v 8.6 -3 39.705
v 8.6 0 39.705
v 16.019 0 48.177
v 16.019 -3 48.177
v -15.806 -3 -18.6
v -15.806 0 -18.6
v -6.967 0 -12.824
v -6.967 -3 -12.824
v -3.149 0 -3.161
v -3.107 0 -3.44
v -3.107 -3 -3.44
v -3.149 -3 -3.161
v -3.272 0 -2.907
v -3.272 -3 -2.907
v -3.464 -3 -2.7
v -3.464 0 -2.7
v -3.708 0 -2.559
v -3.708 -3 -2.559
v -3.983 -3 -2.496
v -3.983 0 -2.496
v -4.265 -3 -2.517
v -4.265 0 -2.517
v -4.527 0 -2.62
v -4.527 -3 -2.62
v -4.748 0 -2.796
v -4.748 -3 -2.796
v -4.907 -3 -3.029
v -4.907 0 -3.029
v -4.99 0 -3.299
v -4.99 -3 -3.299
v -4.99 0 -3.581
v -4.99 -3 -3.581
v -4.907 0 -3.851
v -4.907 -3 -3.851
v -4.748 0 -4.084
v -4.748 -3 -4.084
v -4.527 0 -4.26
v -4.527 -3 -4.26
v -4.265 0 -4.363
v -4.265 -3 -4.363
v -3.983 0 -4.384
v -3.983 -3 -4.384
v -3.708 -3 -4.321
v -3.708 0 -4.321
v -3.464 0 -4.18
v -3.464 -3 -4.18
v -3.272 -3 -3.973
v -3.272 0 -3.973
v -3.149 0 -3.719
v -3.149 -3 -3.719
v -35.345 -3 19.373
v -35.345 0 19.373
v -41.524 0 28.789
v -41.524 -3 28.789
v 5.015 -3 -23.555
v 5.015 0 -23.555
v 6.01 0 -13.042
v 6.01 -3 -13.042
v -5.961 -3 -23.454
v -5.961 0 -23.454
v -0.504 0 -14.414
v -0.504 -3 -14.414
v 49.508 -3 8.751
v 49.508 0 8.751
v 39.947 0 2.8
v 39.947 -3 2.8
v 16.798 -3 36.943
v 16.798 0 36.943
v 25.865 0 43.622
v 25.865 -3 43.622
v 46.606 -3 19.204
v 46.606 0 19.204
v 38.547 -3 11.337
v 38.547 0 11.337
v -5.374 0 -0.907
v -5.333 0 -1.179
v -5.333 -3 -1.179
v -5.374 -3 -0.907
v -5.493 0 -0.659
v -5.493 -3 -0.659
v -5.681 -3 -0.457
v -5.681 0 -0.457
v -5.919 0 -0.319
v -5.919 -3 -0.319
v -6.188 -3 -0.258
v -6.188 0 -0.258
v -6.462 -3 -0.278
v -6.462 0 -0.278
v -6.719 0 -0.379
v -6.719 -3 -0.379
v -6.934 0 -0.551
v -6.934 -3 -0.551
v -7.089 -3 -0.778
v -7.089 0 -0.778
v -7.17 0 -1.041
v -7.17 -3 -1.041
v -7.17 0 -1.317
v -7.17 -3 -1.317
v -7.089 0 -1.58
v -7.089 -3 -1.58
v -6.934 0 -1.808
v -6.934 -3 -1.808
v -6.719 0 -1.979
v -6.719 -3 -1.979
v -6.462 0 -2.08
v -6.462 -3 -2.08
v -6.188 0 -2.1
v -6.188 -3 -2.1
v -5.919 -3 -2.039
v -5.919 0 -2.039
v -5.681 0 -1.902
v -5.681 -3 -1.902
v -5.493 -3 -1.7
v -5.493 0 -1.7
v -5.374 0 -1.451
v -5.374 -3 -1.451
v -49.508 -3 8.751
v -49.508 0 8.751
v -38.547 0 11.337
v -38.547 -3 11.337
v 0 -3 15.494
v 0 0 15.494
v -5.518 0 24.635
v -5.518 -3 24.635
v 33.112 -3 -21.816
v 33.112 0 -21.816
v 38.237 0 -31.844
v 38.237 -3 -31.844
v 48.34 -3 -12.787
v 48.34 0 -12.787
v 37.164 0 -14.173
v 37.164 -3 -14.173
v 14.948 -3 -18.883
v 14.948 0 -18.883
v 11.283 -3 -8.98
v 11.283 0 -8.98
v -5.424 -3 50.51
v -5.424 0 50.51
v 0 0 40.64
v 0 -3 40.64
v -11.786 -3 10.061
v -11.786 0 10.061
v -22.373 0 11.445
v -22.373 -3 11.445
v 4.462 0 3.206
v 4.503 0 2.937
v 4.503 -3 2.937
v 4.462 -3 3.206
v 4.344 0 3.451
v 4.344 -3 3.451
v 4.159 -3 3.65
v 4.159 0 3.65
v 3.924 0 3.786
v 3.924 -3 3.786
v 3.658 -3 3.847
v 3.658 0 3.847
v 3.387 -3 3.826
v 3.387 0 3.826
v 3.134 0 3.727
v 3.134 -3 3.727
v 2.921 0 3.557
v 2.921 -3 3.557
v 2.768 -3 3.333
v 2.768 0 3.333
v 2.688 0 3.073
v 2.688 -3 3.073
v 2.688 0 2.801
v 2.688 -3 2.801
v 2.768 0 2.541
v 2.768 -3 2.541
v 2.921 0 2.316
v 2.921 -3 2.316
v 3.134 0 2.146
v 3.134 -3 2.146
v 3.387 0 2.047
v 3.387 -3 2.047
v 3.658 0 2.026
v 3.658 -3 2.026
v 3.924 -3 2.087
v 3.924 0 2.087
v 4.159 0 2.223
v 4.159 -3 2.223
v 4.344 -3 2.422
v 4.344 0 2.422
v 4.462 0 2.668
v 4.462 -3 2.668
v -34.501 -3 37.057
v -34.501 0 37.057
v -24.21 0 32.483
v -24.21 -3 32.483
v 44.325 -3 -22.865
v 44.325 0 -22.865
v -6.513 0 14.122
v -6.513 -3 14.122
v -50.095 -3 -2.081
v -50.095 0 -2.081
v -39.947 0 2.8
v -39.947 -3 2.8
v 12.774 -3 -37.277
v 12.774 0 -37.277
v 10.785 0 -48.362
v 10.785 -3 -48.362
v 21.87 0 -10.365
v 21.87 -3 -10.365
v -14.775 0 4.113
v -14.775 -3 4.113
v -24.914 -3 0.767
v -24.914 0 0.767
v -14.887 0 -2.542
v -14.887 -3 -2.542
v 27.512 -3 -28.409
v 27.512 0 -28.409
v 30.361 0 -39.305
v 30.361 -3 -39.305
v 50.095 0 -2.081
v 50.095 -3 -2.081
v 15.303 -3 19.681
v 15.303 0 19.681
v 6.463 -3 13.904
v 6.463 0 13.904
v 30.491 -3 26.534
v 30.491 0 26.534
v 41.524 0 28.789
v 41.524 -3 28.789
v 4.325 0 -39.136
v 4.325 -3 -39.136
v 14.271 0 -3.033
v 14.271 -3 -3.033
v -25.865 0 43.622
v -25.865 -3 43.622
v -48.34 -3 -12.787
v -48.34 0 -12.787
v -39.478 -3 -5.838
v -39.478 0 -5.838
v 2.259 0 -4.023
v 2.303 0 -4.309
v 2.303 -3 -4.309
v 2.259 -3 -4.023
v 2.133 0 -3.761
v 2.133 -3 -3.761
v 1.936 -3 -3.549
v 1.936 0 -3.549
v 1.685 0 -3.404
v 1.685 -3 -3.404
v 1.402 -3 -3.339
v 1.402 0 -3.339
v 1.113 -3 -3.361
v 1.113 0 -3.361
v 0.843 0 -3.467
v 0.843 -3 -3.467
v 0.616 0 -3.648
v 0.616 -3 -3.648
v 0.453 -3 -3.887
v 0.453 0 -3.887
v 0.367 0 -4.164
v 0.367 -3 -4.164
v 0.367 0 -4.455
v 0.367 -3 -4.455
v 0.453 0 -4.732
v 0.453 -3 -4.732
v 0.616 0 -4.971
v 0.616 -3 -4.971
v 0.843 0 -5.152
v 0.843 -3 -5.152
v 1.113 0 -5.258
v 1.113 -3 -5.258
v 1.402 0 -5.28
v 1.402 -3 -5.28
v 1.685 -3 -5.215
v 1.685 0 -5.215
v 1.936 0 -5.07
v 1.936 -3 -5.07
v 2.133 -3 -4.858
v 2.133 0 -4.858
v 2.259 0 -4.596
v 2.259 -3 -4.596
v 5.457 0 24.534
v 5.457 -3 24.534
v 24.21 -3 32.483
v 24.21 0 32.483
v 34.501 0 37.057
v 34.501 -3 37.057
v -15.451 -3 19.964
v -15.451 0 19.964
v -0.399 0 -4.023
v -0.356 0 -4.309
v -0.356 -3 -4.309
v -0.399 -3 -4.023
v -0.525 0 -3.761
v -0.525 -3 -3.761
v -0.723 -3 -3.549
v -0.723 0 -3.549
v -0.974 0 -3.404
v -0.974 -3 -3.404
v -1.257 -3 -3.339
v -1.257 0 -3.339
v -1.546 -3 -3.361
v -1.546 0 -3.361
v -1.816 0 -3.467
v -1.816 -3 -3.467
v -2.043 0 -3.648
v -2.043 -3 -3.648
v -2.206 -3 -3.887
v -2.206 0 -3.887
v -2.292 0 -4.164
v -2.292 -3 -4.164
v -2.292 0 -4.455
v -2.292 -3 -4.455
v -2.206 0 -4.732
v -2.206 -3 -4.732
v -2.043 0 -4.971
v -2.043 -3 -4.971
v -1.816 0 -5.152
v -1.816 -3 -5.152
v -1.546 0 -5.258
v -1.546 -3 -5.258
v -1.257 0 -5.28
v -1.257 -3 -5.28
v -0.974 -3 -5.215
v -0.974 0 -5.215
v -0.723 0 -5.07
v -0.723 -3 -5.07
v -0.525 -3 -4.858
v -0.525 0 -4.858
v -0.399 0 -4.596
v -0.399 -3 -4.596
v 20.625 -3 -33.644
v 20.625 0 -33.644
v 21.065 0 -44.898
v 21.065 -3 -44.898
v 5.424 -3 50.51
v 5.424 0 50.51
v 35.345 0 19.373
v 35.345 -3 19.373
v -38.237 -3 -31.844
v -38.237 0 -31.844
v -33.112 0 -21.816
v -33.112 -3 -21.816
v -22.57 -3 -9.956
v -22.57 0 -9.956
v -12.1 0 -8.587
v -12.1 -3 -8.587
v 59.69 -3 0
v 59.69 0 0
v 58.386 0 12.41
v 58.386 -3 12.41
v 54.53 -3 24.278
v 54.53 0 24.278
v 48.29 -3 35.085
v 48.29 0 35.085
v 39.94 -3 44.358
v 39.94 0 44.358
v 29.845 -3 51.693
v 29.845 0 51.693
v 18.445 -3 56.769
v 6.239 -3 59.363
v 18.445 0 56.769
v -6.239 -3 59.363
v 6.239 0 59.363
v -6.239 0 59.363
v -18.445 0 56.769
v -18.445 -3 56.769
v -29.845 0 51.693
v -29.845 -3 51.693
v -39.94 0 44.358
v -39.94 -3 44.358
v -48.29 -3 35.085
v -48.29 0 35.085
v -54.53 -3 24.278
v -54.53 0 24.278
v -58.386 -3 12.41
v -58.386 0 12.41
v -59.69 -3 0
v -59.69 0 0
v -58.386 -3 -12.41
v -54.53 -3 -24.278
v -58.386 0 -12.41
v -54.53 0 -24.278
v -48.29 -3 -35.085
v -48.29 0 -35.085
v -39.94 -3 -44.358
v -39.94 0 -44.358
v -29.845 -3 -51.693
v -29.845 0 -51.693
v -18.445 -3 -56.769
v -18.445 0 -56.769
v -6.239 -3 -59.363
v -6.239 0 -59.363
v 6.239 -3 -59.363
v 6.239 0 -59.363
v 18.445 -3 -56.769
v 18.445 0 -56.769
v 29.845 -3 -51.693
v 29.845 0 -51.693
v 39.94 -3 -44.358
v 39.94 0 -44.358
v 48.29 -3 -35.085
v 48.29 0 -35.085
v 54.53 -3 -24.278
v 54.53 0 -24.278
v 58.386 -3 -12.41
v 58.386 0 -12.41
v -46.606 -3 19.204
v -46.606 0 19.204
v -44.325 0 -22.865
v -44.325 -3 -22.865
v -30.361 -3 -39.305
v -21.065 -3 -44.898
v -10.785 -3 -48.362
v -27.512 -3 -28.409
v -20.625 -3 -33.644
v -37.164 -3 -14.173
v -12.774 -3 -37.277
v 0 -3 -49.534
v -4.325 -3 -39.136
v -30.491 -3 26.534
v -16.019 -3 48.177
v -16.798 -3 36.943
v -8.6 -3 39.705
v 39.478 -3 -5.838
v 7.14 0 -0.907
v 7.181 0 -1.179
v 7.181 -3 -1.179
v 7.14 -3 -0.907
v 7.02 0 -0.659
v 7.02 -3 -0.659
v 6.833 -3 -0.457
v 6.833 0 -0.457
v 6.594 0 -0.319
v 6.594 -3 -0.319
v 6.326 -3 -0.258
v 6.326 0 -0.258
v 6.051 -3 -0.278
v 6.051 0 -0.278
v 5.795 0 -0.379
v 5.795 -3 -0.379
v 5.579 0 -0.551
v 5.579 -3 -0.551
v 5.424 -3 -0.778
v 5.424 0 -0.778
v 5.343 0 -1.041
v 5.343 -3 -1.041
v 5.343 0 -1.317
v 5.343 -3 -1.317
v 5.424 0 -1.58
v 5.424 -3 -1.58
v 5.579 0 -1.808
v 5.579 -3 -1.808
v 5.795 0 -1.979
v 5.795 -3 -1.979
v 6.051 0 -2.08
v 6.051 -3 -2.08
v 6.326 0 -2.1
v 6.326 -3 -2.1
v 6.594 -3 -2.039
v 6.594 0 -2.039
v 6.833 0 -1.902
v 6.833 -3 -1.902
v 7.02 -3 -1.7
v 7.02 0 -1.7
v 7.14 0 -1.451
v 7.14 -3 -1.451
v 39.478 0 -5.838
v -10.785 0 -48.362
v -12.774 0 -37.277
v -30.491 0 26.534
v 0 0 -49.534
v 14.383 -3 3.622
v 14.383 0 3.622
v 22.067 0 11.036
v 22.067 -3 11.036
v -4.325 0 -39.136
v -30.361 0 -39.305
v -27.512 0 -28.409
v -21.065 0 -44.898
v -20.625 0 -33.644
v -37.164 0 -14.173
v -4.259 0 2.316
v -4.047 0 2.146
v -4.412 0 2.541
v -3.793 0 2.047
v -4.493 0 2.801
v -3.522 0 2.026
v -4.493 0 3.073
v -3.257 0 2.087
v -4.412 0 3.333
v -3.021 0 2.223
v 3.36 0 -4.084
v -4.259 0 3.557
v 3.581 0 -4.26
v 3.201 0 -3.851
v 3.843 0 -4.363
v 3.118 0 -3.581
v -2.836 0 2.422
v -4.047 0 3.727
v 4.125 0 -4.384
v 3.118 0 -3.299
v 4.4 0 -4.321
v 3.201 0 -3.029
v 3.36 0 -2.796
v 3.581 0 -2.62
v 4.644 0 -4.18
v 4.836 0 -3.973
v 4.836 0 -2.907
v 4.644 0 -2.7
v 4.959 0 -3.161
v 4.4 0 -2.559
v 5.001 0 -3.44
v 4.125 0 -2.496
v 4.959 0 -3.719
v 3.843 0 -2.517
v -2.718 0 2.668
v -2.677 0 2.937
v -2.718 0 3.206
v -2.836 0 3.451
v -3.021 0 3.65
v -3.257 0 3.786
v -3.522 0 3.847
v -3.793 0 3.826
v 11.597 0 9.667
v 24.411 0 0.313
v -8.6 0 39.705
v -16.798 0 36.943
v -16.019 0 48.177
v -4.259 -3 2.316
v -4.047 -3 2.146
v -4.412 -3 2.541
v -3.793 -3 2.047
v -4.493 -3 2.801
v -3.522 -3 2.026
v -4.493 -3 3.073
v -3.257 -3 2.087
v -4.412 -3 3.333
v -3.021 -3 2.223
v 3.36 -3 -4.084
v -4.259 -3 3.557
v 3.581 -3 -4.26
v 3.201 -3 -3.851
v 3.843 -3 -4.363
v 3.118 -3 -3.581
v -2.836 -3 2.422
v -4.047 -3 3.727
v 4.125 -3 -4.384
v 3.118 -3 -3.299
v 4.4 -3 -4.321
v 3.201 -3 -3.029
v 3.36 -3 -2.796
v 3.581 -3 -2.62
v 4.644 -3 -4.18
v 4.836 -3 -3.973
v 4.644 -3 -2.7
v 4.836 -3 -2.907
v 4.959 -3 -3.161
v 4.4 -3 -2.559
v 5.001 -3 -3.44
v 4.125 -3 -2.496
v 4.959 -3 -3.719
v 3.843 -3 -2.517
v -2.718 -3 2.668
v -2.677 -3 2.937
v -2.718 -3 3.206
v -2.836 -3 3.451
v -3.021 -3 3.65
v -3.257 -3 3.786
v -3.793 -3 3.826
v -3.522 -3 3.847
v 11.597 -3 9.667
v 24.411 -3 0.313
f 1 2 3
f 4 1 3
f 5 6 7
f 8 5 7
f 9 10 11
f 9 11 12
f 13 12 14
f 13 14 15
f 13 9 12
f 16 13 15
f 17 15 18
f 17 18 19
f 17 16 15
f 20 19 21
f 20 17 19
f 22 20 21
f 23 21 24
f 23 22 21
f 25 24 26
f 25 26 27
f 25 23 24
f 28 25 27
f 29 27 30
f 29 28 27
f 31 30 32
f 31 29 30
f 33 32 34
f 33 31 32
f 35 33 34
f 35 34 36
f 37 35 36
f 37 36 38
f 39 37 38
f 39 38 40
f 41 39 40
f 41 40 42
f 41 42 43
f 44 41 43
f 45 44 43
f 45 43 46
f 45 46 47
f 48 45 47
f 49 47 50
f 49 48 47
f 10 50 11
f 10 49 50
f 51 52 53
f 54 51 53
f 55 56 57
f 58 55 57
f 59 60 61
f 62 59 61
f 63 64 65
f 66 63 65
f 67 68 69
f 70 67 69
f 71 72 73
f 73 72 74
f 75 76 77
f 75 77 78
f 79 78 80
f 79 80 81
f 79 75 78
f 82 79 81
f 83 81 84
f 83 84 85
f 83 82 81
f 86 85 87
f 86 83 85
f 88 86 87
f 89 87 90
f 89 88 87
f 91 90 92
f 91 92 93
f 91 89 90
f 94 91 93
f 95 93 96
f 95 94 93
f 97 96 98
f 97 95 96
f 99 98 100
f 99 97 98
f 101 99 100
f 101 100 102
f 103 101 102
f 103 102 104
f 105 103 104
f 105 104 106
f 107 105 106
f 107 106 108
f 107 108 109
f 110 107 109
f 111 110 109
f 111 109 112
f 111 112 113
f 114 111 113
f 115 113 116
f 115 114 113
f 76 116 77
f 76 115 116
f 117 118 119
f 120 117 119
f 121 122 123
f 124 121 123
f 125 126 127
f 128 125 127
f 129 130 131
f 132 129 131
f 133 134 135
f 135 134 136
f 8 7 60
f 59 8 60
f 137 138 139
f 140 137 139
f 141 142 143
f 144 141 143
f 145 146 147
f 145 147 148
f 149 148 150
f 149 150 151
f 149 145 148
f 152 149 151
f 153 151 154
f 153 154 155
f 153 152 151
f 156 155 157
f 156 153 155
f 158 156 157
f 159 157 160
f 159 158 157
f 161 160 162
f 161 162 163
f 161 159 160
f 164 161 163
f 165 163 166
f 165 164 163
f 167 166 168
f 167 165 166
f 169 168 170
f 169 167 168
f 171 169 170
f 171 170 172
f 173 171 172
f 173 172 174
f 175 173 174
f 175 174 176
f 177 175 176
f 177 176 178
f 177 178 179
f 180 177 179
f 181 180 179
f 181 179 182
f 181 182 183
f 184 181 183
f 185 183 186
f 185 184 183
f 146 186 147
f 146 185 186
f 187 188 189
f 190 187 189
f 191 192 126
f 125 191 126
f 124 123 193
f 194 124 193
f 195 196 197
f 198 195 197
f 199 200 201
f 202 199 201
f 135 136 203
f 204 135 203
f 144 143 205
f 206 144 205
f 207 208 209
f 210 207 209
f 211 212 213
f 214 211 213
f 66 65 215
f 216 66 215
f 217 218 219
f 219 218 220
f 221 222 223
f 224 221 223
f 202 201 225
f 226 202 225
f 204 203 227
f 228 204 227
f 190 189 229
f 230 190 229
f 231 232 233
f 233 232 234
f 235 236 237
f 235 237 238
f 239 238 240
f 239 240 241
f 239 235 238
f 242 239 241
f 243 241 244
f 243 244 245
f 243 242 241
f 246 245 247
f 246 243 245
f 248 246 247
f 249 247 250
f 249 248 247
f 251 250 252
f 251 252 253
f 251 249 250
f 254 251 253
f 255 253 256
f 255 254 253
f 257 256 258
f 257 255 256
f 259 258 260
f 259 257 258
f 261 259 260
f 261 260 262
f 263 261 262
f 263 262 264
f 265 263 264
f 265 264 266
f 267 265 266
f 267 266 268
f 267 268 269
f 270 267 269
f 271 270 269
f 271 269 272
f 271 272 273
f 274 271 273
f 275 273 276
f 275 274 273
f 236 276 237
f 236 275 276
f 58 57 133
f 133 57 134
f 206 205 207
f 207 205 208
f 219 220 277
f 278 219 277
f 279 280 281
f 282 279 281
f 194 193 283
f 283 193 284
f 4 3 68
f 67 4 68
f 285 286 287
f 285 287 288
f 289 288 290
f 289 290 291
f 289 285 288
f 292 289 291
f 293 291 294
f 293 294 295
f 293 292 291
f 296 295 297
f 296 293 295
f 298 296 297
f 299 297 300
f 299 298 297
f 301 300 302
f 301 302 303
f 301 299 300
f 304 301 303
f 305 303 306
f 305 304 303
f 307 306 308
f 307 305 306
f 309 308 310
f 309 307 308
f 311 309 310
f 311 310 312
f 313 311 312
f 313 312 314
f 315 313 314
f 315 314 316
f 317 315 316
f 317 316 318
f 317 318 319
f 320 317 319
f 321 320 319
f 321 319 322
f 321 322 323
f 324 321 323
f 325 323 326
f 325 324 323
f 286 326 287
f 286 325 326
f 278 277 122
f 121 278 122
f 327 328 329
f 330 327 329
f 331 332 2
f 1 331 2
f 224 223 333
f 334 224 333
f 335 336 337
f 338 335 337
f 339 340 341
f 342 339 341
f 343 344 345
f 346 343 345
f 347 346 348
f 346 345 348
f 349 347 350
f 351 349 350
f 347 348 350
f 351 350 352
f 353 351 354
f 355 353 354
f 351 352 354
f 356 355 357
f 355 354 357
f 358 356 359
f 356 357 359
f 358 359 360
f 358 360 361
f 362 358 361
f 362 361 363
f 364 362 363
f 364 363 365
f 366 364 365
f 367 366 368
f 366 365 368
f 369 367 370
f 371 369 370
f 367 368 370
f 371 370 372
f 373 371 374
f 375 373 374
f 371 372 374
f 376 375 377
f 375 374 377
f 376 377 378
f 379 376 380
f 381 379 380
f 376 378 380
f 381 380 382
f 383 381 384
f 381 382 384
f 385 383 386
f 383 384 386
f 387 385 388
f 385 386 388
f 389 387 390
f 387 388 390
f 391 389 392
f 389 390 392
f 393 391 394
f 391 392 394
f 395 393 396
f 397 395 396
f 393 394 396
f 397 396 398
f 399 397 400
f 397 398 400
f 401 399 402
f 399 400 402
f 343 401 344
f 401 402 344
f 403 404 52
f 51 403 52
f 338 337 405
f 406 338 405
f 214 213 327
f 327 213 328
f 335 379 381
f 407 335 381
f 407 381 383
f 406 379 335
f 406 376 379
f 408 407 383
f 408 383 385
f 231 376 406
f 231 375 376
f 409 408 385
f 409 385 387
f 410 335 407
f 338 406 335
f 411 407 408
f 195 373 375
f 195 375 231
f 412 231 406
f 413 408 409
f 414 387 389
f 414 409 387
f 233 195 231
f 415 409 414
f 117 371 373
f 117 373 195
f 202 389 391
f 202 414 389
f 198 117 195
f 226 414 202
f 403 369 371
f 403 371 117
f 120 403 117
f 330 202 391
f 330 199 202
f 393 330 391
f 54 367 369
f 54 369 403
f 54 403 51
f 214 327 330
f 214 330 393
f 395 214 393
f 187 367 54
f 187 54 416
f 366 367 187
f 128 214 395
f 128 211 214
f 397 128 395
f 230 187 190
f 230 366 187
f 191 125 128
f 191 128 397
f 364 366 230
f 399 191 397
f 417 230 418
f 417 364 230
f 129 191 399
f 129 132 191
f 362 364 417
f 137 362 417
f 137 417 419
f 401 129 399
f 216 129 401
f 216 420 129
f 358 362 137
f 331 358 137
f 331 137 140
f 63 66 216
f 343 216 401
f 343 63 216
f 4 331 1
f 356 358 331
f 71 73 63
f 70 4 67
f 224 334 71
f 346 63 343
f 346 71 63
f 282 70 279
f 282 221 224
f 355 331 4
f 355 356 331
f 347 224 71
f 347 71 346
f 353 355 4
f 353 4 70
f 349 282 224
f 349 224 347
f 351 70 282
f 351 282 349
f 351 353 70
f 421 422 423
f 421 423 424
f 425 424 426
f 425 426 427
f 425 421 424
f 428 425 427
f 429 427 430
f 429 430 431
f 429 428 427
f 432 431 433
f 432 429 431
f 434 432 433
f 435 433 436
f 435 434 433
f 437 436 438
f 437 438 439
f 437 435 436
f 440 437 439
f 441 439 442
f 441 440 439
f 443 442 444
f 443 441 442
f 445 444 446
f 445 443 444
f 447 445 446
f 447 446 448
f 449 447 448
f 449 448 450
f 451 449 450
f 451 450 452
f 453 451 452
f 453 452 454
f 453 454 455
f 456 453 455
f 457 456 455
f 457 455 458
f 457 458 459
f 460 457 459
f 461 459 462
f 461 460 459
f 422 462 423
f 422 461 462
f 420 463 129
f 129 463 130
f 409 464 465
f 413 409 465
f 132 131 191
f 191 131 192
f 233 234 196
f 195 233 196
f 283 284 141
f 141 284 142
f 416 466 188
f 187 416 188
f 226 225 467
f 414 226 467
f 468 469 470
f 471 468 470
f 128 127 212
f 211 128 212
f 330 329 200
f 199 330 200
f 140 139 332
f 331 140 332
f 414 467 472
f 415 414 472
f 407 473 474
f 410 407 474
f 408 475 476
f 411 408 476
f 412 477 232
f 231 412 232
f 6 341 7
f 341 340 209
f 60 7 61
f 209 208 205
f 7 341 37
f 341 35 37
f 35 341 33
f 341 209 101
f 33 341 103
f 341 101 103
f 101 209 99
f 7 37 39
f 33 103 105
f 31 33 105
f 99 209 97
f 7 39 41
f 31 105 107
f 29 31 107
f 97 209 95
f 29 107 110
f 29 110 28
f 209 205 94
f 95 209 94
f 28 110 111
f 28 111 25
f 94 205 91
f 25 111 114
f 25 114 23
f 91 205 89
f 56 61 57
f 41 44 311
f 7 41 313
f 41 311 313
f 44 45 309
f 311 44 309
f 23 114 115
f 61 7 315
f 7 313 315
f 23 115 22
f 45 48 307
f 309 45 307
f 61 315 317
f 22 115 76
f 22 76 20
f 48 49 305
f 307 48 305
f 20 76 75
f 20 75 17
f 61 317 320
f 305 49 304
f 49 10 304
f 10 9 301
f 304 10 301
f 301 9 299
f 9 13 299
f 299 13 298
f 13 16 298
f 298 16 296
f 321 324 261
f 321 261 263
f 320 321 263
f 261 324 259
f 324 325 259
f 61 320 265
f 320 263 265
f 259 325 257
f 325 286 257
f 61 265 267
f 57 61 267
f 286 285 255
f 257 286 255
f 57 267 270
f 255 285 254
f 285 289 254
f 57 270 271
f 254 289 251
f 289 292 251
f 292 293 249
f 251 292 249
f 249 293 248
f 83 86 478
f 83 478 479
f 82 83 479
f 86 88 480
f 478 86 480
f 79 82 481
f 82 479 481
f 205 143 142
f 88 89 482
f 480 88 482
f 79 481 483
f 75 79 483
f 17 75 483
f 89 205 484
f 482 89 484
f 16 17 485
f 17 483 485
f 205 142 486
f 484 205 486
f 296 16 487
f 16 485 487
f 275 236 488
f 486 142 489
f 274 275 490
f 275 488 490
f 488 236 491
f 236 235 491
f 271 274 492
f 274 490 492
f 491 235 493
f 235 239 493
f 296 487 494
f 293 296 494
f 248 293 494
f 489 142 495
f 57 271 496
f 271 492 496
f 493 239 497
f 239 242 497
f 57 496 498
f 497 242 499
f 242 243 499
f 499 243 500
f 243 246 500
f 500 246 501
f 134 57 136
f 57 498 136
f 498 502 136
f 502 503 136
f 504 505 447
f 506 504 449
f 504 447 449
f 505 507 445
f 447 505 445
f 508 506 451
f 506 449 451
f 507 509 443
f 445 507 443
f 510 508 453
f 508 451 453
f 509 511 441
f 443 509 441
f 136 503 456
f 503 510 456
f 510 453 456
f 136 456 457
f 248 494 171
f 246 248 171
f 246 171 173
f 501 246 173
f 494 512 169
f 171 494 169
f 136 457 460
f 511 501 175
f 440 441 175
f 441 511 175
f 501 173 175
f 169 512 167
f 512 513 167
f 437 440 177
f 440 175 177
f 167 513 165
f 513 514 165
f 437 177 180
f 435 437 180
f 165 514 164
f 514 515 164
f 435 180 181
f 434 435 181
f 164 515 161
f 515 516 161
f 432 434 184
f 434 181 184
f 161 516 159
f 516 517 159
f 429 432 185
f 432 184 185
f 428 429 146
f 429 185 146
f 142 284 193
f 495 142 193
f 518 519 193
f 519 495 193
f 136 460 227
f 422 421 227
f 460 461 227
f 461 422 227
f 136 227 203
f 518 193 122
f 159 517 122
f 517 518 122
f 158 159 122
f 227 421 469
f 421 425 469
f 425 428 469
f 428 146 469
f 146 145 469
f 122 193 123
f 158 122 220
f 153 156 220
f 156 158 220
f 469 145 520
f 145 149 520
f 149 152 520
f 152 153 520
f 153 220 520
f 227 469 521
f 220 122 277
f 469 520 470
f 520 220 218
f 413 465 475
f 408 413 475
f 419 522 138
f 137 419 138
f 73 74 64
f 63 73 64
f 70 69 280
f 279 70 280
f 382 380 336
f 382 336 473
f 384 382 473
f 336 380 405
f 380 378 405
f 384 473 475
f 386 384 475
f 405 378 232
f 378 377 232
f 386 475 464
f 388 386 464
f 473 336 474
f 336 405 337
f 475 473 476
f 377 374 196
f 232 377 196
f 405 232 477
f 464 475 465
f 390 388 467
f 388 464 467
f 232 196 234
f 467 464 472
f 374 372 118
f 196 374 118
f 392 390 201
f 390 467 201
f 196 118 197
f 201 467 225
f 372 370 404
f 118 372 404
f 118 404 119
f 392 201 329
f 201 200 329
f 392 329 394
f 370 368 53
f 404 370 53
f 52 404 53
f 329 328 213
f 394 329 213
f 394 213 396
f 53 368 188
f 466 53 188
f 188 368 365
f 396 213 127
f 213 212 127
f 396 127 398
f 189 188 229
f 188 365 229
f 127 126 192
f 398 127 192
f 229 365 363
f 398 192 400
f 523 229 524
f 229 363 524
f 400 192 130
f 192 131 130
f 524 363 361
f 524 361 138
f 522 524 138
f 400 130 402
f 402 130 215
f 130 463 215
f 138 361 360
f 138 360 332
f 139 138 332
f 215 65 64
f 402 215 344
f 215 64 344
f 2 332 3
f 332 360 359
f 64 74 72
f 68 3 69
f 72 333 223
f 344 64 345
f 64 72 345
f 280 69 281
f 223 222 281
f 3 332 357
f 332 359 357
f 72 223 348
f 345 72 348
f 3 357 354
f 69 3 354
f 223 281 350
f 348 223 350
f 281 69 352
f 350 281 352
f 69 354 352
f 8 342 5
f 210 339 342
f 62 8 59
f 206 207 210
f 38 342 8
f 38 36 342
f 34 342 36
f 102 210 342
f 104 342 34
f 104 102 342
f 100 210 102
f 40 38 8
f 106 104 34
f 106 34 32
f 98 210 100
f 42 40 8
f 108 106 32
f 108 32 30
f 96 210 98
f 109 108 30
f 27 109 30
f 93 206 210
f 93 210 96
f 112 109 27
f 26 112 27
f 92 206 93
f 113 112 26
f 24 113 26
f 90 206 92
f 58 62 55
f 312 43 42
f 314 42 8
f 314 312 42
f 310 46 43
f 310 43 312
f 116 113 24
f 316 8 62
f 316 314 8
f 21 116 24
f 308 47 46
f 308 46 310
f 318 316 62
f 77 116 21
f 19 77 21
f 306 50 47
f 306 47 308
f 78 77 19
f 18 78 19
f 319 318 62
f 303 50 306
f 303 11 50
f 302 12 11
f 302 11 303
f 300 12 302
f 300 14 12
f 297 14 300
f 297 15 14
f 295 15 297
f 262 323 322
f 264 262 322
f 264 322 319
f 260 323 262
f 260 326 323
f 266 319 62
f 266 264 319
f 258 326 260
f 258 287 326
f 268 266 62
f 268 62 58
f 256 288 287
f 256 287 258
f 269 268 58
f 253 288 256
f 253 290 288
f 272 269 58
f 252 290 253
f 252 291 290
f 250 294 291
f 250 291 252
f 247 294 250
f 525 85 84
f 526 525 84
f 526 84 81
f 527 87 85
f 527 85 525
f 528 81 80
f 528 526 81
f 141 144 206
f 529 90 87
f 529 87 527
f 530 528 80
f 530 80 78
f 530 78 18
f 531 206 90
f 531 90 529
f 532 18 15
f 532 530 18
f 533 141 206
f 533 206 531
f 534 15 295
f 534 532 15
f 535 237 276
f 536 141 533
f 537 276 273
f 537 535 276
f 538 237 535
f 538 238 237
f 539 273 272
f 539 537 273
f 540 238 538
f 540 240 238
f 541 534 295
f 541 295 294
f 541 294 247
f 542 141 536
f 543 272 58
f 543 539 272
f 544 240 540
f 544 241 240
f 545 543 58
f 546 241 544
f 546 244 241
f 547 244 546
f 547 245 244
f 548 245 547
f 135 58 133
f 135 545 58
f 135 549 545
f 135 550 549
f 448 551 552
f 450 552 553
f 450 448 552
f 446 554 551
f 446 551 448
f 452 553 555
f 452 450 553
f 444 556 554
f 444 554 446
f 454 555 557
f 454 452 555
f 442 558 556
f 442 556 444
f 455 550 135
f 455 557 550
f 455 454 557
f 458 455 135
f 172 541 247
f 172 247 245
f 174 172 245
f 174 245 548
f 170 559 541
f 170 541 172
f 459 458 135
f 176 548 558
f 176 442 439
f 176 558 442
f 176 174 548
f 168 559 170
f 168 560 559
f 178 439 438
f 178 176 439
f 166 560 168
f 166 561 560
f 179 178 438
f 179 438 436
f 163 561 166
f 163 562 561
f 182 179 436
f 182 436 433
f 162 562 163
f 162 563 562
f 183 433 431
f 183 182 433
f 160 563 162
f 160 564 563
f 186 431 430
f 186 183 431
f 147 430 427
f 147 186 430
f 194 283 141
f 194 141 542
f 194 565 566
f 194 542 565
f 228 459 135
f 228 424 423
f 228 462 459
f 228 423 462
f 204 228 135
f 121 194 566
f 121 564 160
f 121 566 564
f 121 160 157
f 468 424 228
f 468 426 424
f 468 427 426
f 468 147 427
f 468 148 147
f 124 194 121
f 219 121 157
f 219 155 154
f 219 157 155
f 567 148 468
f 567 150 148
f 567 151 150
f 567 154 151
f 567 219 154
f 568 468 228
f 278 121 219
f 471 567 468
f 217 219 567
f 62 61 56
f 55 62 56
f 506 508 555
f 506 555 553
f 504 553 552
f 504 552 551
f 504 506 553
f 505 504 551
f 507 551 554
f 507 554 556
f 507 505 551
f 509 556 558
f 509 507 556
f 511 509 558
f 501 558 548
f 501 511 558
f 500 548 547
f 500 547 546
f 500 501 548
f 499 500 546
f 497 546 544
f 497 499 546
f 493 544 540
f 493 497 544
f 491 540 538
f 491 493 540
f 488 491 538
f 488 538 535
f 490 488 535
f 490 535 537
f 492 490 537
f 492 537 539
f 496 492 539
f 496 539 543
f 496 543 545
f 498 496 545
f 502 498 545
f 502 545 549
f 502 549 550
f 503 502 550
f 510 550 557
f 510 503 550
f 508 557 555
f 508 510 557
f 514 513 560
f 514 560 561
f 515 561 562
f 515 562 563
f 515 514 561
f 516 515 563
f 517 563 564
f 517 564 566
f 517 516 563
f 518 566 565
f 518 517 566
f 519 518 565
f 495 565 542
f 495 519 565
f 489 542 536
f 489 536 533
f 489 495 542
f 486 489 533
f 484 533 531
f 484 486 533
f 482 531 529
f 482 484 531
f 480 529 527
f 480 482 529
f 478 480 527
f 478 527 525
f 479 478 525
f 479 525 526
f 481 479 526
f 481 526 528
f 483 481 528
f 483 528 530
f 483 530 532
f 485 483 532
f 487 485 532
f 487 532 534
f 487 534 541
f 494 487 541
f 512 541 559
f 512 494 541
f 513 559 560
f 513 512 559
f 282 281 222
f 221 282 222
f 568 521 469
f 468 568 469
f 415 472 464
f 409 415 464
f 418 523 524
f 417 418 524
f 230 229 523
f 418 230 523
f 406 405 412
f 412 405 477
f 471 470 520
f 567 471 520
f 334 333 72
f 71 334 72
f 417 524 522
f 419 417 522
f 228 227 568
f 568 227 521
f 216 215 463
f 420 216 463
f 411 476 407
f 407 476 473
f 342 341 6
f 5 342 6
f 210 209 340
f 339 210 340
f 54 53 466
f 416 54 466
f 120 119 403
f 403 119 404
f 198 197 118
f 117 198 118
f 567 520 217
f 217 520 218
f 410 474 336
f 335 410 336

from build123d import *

# Parameters (mm, degrees)
F0_R     = 59.69
F0_R_2   = 0.973209
F0_R_3   = 0.946708
F0_R_4   = 0.923894
F0_R_5   = 0.912695
F1_DEPTH = 3


with BuildPart() as f1:
    # F0 (on Front) → F1 (new body)
    with BuildSketch(Plane.XZ):
        Circle(F0_R)
        Polygon((-5.424229, 50.509581), (0, 40.640013), (5.424229, 50.509581), (8.599977, 39.704709), (16.019056, 48.177483), (16.797829, 36.942531), (25.86485, 43.622334), (24.210233, 32.482636), (34.501232, 37.057127), (30.490593, 26.533562), (41.524375, 28.788844), (35.345247, 19.373483), (46.605884, 19.204101), (38.547197, 11.337196), (49.508154, 8.751069), (39.946722, 2.800468), (50.095477, -2.081479), (39.478383, -5.837533), (48.340392, -12.787025), (37.164079, -14.172903), (44.324964, -22.864989), (33.112024, -21.81589), (38.23695, -31.844139), (27.511687, -28.409116), (30.361018, -39.304617), (20.624935, -33.644289), (21.065439, -44.897582), (12.773783, -37.276619), (10.784864, -48.361511), (4.325344, -39.136261), (0, -49.534435), (-4.325344, -39.136261), (-10.784864, -48.361511), (-12.773783, -37.276619), (-21.065439, -44.897582), (-20.624935, -33.644289), (-30.361018, -39.304617), (-27.511687, -28.409116), (-38.23695, -31.844139), (-33.112024, -21.81589), (-44.324964, -22.864989), (-37.164079, -14.172903), (-48.340392, -12.787025), (-39.478383, -5.837533), (-50.095477, -2.081479), (-39.946722, 2.800468), (-49.508154, 8.751069), (-38.547197, 11.337196), (-46.605884, 19.204101), (-35.345247, 19.373483), (-41.524375, 28.788844), (-30.490593, 26.533562), (-34.501232, 37.057127), (-24.210233, 32.482636), (-25.86485, 43.622334), (-16.797829, 36.942531), (-16.019056, 48.177483), (-8.599977, 39.704709), align=None, mode=Mode.SUBTRACT)
        Polygon((5.457441, 24.533876), (0, 15.494), (-5.518424, 24.634891), (-6.513153, 14.122349), (-15.451165, 19.963654), (-11.786164, 10.060584), (-22.373481, 11.445359), (-14.774648, 4.113186), (-24.914323, 0.76716), (-14.886701, -2.541889), (-22.570446, -9.955994), (-12.100128, -8.586523), (-15.806083, -18.600253), (-6.966844, -12.8235), (-5.961, -23.453513), (-0.503559, -14.413637), (5.014865, -23.554528), (6.009594, -13.041986), (14.947606, -18.883291), (11.282604, -8.980221), (21.869922, -10.364996), (14.271089, -3.032823), (24.410764, 0.313203), (14.383142, 3.622252), (22.066887, 11.036358), (11.596568, 9.666886), (15.302524, 19.680616), (6.463285, 13.903863), align=None)
        with Locations((-1.329379, -4.309488)):
            Circle(F0_R_2, mode=Mode.SUBTRACT)
        with Locations((-4.053914, -3.439955)):
            Circle(F0_R_3, mode=Mode.SUBTRACT)
        with Locations((-6.25673, -1.179171)):
            Circle(F0_R_4, mode=Mode.SUBTRACT)
        with Locations((1.329379, -4.309488)):
            Circle(F0_R_2, mode=Mode.SUBTRACT)
        with Locations((4.053914, -3.439955)):
            Circle(F0_R_3, mode=Mode.SUBTRACT)
        with Locations((6.25673, -1.179171)):
            Circle(F0_R_4, mode=Mode.SUBTRACT)
        with Locations((-3.590164, 2.936617)):
            Circle(F0_R_5, mode=Mode.SUBTRACT)
        with Locations((3.590164, 2.936617)):
            Circle(F0_R_5, mode=Mode.SUBTRACT)
    extrude(amount=F1_DEPTH)


solid = f1.part
